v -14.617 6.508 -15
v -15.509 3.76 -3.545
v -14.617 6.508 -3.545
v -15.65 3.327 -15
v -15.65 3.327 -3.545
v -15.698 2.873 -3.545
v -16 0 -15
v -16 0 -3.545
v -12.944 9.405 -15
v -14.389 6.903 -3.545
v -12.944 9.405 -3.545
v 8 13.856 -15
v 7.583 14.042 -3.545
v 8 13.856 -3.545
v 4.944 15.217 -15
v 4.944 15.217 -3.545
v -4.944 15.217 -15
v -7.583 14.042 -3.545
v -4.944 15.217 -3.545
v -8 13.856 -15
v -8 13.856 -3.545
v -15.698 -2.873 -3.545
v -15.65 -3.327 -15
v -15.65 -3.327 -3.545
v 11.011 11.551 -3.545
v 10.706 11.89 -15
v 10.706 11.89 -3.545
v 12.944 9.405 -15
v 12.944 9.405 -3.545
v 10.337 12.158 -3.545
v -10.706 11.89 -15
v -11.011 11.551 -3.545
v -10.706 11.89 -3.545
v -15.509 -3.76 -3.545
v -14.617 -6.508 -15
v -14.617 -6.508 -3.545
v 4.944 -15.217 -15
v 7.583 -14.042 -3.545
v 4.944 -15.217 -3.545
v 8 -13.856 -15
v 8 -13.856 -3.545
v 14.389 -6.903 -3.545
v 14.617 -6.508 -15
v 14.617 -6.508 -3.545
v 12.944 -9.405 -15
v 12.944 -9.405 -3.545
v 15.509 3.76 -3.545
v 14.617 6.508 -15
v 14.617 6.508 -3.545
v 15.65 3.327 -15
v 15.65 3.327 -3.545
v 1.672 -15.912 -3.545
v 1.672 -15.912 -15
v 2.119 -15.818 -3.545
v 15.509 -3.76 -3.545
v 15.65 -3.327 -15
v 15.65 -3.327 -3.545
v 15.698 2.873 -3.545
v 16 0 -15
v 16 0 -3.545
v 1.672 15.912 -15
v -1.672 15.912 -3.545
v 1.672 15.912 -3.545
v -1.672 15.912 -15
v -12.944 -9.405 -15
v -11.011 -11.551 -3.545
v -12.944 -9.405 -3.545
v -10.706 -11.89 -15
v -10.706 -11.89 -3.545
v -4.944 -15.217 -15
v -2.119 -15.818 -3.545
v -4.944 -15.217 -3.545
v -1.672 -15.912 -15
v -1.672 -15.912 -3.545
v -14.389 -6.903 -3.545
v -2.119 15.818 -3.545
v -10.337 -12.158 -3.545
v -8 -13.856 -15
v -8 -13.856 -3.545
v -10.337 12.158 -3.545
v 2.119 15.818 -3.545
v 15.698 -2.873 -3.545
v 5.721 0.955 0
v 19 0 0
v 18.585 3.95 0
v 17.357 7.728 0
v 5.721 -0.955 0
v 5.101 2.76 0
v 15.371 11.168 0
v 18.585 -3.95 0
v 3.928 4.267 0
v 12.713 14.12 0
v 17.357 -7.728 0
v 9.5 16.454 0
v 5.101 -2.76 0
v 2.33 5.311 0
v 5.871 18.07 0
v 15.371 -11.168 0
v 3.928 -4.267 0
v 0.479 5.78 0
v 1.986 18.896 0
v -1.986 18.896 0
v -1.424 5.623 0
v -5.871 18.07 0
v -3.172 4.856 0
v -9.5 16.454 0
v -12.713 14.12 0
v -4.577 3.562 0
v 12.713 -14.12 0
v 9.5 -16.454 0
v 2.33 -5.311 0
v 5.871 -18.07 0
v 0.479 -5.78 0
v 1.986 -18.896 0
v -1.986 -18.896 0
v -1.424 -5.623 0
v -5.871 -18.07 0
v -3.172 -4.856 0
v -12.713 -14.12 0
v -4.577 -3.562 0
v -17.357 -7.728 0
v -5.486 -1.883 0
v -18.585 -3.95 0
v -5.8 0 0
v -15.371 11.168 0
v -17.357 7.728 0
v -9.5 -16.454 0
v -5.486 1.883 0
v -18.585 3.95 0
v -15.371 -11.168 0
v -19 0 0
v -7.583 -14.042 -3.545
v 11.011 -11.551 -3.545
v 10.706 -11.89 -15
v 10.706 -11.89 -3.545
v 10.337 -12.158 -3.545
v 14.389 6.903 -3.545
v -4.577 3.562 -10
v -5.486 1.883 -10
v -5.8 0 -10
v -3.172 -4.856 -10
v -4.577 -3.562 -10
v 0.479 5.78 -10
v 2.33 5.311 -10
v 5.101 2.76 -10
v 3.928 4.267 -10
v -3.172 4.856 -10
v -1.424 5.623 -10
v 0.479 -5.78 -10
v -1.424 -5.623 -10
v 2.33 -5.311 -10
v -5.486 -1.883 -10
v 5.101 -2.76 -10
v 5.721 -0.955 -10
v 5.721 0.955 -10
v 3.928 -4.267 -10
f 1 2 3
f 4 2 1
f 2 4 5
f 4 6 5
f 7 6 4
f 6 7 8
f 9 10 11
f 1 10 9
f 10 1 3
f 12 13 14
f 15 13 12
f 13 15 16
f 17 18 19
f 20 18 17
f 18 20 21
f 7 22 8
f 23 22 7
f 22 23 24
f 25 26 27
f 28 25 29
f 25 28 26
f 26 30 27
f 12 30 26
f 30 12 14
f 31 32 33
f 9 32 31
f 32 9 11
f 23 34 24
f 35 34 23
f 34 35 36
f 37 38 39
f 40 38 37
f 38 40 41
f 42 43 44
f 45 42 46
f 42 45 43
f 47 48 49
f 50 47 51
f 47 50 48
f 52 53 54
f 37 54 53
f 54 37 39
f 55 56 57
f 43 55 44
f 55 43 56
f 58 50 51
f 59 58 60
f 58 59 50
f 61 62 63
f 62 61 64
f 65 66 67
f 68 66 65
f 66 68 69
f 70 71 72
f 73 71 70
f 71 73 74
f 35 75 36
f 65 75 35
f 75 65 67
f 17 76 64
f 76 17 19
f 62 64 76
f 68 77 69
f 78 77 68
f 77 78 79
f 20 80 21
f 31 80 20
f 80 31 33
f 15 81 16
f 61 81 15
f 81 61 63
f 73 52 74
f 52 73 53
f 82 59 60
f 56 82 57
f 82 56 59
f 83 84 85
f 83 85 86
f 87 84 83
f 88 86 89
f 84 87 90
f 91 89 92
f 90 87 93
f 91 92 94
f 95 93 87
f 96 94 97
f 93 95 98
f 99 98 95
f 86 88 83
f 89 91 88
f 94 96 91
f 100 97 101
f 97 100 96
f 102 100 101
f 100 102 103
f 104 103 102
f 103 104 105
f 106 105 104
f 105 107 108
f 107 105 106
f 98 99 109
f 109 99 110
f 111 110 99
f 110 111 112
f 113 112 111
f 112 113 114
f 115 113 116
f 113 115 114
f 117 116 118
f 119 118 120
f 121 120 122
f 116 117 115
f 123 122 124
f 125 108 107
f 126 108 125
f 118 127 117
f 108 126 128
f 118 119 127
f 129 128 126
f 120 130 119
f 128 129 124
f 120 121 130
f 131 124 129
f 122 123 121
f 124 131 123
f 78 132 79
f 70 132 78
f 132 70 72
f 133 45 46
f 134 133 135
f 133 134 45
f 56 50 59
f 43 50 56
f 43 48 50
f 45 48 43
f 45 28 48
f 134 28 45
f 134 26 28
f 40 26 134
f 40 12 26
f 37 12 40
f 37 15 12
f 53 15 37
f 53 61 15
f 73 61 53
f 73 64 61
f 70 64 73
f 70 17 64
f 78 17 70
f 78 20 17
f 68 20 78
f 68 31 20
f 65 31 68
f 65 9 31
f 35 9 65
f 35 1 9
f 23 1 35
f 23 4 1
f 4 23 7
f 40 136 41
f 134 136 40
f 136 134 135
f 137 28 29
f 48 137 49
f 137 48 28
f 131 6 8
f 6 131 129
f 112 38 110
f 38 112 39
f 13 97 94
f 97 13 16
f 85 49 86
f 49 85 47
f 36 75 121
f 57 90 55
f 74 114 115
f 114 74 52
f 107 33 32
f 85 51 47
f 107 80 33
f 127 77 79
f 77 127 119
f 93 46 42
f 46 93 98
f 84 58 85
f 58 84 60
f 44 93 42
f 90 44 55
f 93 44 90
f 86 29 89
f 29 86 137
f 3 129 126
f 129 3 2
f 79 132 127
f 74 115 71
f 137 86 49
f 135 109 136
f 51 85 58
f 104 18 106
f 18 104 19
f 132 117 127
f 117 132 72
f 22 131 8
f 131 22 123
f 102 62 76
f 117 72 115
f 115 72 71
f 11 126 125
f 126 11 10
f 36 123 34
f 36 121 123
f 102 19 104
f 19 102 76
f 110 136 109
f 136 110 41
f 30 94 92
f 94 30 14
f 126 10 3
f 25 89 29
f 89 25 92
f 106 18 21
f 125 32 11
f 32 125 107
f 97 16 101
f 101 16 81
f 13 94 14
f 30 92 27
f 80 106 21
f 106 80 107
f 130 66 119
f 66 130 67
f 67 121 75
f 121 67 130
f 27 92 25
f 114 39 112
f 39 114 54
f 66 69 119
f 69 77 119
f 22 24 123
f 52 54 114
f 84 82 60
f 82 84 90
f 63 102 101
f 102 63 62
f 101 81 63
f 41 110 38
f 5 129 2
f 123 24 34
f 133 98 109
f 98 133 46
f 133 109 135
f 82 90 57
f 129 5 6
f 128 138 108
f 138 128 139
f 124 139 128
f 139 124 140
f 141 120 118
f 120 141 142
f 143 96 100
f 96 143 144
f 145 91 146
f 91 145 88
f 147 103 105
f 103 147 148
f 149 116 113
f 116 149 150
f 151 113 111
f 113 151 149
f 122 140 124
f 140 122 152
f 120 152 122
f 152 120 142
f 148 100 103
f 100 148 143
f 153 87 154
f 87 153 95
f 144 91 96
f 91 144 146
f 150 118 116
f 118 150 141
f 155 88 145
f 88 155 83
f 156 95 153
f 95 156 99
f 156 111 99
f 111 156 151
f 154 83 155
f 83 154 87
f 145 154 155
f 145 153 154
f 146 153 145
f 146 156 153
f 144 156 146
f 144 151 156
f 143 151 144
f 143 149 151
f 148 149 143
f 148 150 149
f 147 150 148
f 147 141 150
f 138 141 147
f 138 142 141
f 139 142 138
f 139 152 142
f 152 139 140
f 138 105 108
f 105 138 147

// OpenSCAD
kWidth = 16;
kHeight = 15;

k2Width = 19;
k2Width2 = 8;
k2Height = 13;

k3Width = 15;
k3Height = 2; 

rotate(a=[0,180,0]) union(){
difference(){
union(){
cylinder(kHeight,kWidth,kWidth);
cylinder(k2Height,k2Width,k2Width2);
}
translate([0,0,0])cylinder(10,5.8,5.8);
//translate([0,0,0])cylinder(k3Height,k3Width,k3Width);
}

//translate([-21.7,0,.12])rotate([40,0,270]) linear_extrude(height //= 1) polygon([[0,0],[-4,7],[0,5],[4,7]], [[0,1,2,3]]);

}
